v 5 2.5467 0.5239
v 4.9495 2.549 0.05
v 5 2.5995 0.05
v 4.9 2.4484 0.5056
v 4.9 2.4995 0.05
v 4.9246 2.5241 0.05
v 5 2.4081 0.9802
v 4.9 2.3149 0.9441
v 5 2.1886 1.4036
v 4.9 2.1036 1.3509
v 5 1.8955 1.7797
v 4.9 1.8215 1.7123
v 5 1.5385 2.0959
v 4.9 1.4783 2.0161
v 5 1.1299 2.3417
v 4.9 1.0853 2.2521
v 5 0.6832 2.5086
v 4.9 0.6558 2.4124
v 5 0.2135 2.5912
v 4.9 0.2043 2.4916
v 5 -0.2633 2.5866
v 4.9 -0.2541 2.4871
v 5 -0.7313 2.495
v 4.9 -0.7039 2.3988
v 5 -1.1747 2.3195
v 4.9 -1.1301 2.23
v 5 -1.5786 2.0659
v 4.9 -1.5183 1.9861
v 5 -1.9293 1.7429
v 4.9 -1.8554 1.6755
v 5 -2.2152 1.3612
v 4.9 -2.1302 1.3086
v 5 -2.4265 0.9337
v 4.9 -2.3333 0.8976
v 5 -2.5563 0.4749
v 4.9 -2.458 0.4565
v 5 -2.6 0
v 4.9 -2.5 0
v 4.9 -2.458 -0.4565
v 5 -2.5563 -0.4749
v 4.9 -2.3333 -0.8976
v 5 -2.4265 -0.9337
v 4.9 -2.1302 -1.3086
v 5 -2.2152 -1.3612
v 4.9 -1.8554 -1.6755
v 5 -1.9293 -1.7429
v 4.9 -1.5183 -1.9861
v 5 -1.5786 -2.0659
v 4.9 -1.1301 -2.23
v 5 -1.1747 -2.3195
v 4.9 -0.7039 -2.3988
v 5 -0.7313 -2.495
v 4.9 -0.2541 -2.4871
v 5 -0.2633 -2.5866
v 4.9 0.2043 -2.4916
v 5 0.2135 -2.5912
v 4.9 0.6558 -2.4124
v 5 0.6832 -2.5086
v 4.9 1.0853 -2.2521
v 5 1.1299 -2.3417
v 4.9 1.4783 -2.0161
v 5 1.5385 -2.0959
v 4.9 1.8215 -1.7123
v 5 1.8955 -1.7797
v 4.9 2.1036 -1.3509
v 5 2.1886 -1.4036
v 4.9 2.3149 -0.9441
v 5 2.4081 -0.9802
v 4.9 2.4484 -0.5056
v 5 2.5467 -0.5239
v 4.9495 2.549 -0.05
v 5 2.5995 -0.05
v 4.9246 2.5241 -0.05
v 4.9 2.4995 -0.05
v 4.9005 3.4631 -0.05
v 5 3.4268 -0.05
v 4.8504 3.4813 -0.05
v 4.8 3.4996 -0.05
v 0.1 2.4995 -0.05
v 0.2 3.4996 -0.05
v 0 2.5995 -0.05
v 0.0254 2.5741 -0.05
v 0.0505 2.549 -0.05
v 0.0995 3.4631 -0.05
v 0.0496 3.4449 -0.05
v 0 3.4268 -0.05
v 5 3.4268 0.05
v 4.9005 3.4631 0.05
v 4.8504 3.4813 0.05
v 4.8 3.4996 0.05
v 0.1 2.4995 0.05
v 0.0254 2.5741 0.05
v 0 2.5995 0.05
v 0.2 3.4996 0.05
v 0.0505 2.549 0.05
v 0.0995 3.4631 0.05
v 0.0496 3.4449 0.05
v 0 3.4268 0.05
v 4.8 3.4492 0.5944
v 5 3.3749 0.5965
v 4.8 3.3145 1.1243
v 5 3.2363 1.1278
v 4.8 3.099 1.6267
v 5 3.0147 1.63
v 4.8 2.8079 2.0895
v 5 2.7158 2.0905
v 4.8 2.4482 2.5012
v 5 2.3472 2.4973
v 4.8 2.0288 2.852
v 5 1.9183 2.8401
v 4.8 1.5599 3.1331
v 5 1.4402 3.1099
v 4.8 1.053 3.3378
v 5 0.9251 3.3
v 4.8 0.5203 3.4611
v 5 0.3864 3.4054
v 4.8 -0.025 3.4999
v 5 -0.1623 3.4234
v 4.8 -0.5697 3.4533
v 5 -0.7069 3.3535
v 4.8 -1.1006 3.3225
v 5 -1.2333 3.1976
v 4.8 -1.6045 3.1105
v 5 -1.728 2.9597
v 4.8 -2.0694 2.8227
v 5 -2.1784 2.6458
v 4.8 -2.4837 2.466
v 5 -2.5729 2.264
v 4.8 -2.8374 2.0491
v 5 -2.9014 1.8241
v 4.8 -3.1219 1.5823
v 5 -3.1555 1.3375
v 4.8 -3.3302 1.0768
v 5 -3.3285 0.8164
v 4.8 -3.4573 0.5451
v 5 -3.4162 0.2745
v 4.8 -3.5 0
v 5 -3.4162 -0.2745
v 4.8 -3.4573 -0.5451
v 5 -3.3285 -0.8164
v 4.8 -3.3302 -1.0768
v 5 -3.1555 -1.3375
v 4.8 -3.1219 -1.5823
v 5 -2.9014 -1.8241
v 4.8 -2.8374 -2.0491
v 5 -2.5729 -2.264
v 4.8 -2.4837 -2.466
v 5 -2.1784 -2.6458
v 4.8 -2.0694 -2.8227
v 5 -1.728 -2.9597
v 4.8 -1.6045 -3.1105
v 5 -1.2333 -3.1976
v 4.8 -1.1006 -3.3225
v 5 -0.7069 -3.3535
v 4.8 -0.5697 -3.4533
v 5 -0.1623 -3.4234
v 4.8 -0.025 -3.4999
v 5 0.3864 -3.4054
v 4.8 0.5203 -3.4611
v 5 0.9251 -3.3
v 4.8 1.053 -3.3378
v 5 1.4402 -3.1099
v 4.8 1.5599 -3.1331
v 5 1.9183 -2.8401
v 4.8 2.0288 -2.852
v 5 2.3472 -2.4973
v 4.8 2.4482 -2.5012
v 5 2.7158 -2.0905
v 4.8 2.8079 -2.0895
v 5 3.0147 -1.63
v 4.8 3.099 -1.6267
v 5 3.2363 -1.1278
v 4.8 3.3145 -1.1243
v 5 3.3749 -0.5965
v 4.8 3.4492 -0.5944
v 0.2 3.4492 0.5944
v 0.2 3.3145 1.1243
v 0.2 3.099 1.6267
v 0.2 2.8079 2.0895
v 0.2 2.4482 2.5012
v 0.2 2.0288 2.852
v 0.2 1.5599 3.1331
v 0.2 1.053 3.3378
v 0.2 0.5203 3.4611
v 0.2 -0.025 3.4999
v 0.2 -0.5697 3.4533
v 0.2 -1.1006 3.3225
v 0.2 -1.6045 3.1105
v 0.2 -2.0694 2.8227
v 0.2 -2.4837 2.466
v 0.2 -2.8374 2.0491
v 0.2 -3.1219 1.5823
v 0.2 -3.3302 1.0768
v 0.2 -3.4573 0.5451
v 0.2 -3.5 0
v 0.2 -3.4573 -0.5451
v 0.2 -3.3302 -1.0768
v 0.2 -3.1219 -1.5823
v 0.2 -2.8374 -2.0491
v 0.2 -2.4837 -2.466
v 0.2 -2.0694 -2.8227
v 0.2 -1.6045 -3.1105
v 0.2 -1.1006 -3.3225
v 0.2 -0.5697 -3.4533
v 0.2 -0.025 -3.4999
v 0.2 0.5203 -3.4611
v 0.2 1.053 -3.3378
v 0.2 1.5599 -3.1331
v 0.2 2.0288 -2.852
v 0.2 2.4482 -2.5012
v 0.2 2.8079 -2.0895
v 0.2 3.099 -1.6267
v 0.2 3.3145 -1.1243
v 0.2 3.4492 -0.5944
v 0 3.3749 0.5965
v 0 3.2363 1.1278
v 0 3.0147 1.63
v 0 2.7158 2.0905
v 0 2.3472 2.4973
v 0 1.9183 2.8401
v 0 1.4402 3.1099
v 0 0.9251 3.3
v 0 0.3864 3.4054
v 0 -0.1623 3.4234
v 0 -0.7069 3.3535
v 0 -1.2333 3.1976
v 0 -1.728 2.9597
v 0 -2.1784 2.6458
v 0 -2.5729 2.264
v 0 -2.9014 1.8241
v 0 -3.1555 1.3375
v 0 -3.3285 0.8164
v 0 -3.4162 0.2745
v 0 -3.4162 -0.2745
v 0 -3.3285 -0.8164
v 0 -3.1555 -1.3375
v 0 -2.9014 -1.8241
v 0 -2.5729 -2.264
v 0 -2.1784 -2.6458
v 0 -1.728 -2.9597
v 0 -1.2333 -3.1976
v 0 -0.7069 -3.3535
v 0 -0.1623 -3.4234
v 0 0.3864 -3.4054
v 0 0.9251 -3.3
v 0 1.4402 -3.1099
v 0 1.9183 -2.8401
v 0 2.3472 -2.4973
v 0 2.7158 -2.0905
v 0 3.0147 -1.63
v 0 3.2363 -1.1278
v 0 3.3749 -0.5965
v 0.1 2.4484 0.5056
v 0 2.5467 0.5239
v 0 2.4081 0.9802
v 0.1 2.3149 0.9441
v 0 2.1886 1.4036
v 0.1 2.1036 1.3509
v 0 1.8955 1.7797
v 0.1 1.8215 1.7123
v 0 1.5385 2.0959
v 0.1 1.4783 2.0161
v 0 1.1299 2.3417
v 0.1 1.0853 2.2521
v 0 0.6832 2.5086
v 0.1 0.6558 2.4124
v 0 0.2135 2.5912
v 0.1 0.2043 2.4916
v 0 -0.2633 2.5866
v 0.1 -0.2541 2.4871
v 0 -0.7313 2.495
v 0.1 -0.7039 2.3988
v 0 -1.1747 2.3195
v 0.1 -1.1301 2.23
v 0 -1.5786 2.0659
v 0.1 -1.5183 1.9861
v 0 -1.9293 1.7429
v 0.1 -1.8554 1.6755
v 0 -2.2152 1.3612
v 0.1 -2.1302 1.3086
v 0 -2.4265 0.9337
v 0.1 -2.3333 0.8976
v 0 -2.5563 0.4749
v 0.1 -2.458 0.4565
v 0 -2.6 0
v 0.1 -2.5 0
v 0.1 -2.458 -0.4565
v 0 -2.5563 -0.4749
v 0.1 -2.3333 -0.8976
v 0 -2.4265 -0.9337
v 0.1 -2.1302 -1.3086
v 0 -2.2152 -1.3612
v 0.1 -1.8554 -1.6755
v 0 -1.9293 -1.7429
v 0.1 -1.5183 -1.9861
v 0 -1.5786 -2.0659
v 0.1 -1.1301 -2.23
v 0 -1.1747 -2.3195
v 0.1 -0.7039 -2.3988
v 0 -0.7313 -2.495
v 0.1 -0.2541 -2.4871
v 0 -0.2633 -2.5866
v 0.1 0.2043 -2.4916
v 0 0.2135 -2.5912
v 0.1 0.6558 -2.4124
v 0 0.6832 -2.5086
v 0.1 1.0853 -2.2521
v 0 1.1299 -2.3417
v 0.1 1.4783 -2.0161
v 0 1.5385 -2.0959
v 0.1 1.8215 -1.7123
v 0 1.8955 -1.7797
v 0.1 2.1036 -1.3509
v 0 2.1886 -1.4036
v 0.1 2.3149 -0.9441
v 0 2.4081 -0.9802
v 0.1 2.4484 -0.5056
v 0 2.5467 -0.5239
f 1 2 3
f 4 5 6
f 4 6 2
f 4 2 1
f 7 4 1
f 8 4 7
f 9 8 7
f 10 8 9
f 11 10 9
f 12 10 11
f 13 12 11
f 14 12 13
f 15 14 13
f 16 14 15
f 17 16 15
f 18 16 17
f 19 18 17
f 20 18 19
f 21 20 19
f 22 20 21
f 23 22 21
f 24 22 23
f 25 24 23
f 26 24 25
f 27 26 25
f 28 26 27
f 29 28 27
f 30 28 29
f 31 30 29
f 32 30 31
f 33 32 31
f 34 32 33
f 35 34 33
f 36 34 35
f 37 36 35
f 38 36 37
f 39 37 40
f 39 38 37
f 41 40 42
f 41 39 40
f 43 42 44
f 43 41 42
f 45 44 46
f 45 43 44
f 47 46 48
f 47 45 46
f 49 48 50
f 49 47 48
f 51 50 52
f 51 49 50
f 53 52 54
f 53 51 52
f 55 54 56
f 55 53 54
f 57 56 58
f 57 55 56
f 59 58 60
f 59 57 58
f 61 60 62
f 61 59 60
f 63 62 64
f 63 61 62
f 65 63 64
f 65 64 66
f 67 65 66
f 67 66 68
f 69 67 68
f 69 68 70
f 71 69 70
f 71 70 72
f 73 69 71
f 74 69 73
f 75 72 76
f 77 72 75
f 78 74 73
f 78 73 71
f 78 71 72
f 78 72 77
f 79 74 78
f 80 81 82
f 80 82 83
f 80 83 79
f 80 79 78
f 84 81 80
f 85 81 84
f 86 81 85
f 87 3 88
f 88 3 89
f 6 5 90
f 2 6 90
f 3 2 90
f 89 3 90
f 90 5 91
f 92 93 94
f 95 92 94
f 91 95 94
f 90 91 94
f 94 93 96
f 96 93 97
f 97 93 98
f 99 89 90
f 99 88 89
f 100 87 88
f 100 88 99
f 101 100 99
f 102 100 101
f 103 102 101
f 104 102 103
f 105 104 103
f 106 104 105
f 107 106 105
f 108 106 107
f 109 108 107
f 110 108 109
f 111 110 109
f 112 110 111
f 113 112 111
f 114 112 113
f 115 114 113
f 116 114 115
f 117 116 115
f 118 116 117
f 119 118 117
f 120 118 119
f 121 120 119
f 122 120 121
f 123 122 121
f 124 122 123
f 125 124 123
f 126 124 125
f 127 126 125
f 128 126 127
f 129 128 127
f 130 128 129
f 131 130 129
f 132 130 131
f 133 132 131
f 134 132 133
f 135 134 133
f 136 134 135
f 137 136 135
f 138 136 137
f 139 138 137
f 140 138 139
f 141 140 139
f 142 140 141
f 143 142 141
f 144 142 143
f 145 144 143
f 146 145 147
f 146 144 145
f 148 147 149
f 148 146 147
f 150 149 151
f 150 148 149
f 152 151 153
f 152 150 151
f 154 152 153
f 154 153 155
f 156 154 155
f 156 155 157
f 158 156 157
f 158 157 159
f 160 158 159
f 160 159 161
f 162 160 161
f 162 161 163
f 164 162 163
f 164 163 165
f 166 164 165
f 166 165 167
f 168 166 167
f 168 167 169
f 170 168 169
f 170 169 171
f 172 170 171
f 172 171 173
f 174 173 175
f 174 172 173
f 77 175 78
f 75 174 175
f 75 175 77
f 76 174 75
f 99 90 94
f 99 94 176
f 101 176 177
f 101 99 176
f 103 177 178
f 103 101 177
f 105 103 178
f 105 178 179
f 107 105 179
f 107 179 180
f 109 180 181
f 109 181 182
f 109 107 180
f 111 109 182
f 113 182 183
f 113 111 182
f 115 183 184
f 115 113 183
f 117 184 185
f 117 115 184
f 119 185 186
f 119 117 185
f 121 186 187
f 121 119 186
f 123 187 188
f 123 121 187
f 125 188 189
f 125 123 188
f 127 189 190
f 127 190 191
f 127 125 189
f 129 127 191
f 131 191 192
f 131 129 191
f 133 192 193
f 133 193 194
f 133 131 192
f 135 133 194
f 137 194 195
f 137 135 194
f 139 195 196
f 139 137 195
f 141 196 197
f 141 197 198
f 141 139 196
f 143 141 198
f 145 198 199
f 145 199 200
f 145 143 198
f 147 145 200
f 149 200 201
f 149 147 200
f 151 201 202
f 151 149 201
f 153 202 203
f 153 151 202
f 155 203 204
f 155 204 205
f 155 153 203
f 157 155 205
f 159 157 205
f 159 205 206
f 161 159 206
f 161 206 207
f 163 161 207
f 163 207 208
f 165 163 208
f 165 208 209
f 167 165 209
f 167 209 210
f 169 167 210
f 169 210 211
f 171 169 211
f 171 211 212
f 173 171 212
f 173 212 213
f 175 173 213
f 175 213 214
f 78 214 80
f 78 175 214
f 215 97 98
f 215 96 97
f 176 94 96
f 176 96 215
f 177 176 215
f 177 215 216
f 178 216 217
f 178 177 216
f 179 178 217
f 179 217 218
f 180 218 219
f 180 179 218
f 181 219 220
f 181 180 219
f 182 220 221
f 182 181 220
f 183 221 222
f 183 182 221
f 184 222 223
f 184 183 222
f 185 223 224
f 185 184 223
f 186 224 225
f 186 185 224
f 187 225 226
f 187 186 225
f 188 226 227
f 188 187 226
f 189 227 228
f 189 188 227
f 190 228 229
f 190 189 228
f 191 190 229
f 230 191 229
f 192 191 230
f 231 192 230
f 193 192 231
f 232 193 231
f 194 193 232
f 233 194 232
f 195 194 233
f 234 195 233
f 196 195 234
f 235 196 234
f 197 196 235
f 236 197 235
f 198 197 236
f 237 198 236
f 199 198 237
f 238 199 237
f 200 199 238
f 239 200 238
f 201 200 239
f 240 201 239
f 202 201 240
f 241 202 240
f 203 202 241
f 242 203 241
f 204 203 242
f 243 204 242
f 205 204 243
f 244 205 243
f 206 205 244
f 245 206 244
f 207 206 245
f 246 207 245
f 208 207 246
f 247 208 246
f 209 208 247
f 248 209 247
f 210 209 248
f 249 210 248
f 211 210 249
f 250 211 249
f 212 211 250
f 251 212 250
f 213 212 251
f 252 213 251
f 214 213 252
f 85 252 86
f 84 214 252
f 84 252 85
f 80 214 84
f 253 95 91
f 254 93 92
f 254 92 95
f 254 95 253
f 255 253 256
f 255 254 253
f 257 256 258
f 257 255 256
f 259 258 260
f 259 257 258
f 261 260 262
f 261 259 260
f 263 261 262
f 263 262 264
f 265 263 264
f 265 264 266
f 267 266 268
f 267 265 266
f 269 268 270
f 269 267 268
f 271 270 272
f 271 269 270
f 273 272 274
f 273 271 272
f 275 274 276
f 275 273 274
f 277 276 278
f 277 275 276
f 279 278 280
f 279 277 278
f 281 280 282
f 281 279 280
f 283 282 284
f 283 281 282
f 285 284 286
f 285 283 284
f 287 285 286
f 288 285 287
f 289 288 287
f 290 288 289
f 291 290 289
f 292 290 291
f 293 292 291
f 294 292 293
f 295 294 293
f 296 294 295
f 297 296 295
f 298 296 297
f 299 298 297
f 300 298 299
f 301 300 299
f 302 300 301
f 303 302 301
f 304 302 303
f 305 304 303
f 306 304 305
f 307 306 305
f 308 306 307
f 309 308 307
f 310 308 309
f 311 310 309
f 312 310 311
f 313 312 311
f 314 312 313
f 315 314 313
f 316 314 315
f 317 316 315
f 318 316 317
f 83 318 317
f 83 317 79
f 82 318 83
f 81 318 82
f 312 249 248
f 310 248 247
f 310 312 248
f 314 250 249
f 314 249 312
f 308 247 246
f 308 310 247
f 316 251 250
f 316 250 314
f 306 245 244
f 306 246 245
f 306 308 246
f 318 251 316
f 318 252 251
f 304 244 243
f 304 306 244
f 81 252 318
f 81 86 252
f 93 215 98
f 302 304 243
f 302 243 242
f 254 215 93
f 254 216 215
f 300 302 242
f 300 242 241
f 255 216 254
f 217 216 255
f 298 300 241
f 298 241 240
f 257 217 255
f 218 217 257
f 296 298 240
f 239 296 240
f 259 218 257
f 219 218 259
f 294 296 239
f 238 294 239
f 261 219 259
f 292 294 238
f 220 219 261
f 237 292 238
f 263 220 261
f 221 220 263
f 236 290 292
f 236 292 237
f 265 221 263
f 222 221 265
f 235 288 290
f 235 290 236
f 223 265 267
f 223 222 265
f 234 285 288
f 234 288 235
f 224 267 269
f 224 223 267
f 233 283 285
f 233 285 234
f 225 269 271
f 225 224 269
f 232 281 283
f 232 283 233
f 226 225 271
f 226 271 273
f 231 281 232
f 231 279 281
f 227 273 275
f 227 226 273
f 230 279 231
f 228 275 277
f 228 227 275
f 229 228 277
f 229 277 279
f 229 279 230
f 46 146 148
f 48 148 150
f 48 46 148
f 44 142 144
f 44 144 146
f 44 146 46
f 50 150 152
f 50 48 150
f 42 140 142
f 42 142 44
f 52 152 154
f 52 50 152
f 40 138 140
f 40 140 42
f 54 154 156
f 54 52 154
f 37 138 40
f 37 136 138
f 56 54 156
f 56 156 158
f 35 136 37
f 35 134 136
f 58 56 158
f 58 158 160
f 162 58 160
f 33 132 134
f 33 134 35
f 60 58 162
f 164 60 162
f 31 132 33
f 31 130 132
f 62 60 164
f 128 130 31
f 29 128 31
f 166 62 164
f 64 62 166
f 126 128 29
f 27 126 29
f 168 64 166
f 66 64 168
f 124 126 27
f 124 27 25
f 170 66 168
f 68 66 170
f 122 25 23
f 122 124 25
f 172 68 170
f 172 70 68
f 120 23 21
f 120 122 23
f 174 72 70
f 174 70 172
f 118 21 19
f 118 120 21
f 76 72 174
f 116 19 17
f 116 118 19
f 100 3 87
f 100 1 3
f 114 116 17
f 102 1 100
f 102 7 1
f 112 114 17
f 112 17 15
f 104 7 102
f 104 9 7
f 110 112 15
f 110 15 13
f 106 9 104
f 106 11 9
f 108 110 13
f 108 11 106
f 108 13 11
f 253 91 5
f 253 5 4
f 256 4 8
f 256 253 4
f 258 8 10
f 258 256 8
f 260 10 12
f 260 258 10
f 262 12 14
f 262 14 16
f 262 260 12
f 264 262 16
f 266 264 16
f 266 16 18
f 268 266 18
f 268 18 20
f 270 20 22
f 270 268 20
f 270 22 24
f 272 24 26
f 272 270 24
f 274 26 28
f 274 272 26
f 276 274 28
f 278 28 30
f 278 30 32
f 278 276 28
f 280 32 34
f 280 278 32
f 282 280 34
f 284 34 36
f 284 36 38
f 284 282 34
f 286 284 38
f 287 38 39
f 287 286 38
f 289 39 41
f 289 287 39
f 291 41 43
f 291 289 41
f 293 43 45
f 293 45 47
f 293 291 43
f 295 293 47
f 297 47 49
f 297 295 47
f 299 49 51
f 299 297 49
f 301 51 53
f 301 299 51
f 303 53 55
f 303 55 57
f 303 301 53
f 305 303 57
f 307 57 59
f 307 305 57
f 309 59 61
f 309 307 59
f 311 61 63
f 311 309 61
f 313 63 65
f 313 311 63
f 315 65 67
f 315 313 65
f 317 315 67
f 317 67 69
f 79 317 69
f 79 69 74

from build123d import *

# Parameters (mm, degrees)
SKETCH_2_W          = 0.1
SKETCH_2_H          = 3.5
CUT_EXTRUDE_1_DEPTH = 6


with BuildPart() as part:
    # 草图1 → 旋转1 (revolve)
    with BuildSketch(Plane.XY):
        Polygon((0.2, 3.5), (4.8, 3.5), (5, 3.427205953), (5, 2.6), (4.9, 2.5), (0.1, 2.5), (0, 2.6), (0, 3.427205953), align=None)
    revolve(axis=Axis((0, 0, 0), (1, 0, 0)))

    # 草图2 → 切除-拉伸1 (cut, through all)
    with BuildSketch(Plane(origin=(0, 0, 0), x_dir=(0, 0, -1), z_dir=(1, 0, 0))):
        with Locations((0, 1.75)):
            Rectangle(SKETCH_2_W, SKETCH_2_H)
    extrude(amount=CUT_EXTRUDE_1_DEPTH, mode=Mode.SUBTRACT)


solid = part.part
